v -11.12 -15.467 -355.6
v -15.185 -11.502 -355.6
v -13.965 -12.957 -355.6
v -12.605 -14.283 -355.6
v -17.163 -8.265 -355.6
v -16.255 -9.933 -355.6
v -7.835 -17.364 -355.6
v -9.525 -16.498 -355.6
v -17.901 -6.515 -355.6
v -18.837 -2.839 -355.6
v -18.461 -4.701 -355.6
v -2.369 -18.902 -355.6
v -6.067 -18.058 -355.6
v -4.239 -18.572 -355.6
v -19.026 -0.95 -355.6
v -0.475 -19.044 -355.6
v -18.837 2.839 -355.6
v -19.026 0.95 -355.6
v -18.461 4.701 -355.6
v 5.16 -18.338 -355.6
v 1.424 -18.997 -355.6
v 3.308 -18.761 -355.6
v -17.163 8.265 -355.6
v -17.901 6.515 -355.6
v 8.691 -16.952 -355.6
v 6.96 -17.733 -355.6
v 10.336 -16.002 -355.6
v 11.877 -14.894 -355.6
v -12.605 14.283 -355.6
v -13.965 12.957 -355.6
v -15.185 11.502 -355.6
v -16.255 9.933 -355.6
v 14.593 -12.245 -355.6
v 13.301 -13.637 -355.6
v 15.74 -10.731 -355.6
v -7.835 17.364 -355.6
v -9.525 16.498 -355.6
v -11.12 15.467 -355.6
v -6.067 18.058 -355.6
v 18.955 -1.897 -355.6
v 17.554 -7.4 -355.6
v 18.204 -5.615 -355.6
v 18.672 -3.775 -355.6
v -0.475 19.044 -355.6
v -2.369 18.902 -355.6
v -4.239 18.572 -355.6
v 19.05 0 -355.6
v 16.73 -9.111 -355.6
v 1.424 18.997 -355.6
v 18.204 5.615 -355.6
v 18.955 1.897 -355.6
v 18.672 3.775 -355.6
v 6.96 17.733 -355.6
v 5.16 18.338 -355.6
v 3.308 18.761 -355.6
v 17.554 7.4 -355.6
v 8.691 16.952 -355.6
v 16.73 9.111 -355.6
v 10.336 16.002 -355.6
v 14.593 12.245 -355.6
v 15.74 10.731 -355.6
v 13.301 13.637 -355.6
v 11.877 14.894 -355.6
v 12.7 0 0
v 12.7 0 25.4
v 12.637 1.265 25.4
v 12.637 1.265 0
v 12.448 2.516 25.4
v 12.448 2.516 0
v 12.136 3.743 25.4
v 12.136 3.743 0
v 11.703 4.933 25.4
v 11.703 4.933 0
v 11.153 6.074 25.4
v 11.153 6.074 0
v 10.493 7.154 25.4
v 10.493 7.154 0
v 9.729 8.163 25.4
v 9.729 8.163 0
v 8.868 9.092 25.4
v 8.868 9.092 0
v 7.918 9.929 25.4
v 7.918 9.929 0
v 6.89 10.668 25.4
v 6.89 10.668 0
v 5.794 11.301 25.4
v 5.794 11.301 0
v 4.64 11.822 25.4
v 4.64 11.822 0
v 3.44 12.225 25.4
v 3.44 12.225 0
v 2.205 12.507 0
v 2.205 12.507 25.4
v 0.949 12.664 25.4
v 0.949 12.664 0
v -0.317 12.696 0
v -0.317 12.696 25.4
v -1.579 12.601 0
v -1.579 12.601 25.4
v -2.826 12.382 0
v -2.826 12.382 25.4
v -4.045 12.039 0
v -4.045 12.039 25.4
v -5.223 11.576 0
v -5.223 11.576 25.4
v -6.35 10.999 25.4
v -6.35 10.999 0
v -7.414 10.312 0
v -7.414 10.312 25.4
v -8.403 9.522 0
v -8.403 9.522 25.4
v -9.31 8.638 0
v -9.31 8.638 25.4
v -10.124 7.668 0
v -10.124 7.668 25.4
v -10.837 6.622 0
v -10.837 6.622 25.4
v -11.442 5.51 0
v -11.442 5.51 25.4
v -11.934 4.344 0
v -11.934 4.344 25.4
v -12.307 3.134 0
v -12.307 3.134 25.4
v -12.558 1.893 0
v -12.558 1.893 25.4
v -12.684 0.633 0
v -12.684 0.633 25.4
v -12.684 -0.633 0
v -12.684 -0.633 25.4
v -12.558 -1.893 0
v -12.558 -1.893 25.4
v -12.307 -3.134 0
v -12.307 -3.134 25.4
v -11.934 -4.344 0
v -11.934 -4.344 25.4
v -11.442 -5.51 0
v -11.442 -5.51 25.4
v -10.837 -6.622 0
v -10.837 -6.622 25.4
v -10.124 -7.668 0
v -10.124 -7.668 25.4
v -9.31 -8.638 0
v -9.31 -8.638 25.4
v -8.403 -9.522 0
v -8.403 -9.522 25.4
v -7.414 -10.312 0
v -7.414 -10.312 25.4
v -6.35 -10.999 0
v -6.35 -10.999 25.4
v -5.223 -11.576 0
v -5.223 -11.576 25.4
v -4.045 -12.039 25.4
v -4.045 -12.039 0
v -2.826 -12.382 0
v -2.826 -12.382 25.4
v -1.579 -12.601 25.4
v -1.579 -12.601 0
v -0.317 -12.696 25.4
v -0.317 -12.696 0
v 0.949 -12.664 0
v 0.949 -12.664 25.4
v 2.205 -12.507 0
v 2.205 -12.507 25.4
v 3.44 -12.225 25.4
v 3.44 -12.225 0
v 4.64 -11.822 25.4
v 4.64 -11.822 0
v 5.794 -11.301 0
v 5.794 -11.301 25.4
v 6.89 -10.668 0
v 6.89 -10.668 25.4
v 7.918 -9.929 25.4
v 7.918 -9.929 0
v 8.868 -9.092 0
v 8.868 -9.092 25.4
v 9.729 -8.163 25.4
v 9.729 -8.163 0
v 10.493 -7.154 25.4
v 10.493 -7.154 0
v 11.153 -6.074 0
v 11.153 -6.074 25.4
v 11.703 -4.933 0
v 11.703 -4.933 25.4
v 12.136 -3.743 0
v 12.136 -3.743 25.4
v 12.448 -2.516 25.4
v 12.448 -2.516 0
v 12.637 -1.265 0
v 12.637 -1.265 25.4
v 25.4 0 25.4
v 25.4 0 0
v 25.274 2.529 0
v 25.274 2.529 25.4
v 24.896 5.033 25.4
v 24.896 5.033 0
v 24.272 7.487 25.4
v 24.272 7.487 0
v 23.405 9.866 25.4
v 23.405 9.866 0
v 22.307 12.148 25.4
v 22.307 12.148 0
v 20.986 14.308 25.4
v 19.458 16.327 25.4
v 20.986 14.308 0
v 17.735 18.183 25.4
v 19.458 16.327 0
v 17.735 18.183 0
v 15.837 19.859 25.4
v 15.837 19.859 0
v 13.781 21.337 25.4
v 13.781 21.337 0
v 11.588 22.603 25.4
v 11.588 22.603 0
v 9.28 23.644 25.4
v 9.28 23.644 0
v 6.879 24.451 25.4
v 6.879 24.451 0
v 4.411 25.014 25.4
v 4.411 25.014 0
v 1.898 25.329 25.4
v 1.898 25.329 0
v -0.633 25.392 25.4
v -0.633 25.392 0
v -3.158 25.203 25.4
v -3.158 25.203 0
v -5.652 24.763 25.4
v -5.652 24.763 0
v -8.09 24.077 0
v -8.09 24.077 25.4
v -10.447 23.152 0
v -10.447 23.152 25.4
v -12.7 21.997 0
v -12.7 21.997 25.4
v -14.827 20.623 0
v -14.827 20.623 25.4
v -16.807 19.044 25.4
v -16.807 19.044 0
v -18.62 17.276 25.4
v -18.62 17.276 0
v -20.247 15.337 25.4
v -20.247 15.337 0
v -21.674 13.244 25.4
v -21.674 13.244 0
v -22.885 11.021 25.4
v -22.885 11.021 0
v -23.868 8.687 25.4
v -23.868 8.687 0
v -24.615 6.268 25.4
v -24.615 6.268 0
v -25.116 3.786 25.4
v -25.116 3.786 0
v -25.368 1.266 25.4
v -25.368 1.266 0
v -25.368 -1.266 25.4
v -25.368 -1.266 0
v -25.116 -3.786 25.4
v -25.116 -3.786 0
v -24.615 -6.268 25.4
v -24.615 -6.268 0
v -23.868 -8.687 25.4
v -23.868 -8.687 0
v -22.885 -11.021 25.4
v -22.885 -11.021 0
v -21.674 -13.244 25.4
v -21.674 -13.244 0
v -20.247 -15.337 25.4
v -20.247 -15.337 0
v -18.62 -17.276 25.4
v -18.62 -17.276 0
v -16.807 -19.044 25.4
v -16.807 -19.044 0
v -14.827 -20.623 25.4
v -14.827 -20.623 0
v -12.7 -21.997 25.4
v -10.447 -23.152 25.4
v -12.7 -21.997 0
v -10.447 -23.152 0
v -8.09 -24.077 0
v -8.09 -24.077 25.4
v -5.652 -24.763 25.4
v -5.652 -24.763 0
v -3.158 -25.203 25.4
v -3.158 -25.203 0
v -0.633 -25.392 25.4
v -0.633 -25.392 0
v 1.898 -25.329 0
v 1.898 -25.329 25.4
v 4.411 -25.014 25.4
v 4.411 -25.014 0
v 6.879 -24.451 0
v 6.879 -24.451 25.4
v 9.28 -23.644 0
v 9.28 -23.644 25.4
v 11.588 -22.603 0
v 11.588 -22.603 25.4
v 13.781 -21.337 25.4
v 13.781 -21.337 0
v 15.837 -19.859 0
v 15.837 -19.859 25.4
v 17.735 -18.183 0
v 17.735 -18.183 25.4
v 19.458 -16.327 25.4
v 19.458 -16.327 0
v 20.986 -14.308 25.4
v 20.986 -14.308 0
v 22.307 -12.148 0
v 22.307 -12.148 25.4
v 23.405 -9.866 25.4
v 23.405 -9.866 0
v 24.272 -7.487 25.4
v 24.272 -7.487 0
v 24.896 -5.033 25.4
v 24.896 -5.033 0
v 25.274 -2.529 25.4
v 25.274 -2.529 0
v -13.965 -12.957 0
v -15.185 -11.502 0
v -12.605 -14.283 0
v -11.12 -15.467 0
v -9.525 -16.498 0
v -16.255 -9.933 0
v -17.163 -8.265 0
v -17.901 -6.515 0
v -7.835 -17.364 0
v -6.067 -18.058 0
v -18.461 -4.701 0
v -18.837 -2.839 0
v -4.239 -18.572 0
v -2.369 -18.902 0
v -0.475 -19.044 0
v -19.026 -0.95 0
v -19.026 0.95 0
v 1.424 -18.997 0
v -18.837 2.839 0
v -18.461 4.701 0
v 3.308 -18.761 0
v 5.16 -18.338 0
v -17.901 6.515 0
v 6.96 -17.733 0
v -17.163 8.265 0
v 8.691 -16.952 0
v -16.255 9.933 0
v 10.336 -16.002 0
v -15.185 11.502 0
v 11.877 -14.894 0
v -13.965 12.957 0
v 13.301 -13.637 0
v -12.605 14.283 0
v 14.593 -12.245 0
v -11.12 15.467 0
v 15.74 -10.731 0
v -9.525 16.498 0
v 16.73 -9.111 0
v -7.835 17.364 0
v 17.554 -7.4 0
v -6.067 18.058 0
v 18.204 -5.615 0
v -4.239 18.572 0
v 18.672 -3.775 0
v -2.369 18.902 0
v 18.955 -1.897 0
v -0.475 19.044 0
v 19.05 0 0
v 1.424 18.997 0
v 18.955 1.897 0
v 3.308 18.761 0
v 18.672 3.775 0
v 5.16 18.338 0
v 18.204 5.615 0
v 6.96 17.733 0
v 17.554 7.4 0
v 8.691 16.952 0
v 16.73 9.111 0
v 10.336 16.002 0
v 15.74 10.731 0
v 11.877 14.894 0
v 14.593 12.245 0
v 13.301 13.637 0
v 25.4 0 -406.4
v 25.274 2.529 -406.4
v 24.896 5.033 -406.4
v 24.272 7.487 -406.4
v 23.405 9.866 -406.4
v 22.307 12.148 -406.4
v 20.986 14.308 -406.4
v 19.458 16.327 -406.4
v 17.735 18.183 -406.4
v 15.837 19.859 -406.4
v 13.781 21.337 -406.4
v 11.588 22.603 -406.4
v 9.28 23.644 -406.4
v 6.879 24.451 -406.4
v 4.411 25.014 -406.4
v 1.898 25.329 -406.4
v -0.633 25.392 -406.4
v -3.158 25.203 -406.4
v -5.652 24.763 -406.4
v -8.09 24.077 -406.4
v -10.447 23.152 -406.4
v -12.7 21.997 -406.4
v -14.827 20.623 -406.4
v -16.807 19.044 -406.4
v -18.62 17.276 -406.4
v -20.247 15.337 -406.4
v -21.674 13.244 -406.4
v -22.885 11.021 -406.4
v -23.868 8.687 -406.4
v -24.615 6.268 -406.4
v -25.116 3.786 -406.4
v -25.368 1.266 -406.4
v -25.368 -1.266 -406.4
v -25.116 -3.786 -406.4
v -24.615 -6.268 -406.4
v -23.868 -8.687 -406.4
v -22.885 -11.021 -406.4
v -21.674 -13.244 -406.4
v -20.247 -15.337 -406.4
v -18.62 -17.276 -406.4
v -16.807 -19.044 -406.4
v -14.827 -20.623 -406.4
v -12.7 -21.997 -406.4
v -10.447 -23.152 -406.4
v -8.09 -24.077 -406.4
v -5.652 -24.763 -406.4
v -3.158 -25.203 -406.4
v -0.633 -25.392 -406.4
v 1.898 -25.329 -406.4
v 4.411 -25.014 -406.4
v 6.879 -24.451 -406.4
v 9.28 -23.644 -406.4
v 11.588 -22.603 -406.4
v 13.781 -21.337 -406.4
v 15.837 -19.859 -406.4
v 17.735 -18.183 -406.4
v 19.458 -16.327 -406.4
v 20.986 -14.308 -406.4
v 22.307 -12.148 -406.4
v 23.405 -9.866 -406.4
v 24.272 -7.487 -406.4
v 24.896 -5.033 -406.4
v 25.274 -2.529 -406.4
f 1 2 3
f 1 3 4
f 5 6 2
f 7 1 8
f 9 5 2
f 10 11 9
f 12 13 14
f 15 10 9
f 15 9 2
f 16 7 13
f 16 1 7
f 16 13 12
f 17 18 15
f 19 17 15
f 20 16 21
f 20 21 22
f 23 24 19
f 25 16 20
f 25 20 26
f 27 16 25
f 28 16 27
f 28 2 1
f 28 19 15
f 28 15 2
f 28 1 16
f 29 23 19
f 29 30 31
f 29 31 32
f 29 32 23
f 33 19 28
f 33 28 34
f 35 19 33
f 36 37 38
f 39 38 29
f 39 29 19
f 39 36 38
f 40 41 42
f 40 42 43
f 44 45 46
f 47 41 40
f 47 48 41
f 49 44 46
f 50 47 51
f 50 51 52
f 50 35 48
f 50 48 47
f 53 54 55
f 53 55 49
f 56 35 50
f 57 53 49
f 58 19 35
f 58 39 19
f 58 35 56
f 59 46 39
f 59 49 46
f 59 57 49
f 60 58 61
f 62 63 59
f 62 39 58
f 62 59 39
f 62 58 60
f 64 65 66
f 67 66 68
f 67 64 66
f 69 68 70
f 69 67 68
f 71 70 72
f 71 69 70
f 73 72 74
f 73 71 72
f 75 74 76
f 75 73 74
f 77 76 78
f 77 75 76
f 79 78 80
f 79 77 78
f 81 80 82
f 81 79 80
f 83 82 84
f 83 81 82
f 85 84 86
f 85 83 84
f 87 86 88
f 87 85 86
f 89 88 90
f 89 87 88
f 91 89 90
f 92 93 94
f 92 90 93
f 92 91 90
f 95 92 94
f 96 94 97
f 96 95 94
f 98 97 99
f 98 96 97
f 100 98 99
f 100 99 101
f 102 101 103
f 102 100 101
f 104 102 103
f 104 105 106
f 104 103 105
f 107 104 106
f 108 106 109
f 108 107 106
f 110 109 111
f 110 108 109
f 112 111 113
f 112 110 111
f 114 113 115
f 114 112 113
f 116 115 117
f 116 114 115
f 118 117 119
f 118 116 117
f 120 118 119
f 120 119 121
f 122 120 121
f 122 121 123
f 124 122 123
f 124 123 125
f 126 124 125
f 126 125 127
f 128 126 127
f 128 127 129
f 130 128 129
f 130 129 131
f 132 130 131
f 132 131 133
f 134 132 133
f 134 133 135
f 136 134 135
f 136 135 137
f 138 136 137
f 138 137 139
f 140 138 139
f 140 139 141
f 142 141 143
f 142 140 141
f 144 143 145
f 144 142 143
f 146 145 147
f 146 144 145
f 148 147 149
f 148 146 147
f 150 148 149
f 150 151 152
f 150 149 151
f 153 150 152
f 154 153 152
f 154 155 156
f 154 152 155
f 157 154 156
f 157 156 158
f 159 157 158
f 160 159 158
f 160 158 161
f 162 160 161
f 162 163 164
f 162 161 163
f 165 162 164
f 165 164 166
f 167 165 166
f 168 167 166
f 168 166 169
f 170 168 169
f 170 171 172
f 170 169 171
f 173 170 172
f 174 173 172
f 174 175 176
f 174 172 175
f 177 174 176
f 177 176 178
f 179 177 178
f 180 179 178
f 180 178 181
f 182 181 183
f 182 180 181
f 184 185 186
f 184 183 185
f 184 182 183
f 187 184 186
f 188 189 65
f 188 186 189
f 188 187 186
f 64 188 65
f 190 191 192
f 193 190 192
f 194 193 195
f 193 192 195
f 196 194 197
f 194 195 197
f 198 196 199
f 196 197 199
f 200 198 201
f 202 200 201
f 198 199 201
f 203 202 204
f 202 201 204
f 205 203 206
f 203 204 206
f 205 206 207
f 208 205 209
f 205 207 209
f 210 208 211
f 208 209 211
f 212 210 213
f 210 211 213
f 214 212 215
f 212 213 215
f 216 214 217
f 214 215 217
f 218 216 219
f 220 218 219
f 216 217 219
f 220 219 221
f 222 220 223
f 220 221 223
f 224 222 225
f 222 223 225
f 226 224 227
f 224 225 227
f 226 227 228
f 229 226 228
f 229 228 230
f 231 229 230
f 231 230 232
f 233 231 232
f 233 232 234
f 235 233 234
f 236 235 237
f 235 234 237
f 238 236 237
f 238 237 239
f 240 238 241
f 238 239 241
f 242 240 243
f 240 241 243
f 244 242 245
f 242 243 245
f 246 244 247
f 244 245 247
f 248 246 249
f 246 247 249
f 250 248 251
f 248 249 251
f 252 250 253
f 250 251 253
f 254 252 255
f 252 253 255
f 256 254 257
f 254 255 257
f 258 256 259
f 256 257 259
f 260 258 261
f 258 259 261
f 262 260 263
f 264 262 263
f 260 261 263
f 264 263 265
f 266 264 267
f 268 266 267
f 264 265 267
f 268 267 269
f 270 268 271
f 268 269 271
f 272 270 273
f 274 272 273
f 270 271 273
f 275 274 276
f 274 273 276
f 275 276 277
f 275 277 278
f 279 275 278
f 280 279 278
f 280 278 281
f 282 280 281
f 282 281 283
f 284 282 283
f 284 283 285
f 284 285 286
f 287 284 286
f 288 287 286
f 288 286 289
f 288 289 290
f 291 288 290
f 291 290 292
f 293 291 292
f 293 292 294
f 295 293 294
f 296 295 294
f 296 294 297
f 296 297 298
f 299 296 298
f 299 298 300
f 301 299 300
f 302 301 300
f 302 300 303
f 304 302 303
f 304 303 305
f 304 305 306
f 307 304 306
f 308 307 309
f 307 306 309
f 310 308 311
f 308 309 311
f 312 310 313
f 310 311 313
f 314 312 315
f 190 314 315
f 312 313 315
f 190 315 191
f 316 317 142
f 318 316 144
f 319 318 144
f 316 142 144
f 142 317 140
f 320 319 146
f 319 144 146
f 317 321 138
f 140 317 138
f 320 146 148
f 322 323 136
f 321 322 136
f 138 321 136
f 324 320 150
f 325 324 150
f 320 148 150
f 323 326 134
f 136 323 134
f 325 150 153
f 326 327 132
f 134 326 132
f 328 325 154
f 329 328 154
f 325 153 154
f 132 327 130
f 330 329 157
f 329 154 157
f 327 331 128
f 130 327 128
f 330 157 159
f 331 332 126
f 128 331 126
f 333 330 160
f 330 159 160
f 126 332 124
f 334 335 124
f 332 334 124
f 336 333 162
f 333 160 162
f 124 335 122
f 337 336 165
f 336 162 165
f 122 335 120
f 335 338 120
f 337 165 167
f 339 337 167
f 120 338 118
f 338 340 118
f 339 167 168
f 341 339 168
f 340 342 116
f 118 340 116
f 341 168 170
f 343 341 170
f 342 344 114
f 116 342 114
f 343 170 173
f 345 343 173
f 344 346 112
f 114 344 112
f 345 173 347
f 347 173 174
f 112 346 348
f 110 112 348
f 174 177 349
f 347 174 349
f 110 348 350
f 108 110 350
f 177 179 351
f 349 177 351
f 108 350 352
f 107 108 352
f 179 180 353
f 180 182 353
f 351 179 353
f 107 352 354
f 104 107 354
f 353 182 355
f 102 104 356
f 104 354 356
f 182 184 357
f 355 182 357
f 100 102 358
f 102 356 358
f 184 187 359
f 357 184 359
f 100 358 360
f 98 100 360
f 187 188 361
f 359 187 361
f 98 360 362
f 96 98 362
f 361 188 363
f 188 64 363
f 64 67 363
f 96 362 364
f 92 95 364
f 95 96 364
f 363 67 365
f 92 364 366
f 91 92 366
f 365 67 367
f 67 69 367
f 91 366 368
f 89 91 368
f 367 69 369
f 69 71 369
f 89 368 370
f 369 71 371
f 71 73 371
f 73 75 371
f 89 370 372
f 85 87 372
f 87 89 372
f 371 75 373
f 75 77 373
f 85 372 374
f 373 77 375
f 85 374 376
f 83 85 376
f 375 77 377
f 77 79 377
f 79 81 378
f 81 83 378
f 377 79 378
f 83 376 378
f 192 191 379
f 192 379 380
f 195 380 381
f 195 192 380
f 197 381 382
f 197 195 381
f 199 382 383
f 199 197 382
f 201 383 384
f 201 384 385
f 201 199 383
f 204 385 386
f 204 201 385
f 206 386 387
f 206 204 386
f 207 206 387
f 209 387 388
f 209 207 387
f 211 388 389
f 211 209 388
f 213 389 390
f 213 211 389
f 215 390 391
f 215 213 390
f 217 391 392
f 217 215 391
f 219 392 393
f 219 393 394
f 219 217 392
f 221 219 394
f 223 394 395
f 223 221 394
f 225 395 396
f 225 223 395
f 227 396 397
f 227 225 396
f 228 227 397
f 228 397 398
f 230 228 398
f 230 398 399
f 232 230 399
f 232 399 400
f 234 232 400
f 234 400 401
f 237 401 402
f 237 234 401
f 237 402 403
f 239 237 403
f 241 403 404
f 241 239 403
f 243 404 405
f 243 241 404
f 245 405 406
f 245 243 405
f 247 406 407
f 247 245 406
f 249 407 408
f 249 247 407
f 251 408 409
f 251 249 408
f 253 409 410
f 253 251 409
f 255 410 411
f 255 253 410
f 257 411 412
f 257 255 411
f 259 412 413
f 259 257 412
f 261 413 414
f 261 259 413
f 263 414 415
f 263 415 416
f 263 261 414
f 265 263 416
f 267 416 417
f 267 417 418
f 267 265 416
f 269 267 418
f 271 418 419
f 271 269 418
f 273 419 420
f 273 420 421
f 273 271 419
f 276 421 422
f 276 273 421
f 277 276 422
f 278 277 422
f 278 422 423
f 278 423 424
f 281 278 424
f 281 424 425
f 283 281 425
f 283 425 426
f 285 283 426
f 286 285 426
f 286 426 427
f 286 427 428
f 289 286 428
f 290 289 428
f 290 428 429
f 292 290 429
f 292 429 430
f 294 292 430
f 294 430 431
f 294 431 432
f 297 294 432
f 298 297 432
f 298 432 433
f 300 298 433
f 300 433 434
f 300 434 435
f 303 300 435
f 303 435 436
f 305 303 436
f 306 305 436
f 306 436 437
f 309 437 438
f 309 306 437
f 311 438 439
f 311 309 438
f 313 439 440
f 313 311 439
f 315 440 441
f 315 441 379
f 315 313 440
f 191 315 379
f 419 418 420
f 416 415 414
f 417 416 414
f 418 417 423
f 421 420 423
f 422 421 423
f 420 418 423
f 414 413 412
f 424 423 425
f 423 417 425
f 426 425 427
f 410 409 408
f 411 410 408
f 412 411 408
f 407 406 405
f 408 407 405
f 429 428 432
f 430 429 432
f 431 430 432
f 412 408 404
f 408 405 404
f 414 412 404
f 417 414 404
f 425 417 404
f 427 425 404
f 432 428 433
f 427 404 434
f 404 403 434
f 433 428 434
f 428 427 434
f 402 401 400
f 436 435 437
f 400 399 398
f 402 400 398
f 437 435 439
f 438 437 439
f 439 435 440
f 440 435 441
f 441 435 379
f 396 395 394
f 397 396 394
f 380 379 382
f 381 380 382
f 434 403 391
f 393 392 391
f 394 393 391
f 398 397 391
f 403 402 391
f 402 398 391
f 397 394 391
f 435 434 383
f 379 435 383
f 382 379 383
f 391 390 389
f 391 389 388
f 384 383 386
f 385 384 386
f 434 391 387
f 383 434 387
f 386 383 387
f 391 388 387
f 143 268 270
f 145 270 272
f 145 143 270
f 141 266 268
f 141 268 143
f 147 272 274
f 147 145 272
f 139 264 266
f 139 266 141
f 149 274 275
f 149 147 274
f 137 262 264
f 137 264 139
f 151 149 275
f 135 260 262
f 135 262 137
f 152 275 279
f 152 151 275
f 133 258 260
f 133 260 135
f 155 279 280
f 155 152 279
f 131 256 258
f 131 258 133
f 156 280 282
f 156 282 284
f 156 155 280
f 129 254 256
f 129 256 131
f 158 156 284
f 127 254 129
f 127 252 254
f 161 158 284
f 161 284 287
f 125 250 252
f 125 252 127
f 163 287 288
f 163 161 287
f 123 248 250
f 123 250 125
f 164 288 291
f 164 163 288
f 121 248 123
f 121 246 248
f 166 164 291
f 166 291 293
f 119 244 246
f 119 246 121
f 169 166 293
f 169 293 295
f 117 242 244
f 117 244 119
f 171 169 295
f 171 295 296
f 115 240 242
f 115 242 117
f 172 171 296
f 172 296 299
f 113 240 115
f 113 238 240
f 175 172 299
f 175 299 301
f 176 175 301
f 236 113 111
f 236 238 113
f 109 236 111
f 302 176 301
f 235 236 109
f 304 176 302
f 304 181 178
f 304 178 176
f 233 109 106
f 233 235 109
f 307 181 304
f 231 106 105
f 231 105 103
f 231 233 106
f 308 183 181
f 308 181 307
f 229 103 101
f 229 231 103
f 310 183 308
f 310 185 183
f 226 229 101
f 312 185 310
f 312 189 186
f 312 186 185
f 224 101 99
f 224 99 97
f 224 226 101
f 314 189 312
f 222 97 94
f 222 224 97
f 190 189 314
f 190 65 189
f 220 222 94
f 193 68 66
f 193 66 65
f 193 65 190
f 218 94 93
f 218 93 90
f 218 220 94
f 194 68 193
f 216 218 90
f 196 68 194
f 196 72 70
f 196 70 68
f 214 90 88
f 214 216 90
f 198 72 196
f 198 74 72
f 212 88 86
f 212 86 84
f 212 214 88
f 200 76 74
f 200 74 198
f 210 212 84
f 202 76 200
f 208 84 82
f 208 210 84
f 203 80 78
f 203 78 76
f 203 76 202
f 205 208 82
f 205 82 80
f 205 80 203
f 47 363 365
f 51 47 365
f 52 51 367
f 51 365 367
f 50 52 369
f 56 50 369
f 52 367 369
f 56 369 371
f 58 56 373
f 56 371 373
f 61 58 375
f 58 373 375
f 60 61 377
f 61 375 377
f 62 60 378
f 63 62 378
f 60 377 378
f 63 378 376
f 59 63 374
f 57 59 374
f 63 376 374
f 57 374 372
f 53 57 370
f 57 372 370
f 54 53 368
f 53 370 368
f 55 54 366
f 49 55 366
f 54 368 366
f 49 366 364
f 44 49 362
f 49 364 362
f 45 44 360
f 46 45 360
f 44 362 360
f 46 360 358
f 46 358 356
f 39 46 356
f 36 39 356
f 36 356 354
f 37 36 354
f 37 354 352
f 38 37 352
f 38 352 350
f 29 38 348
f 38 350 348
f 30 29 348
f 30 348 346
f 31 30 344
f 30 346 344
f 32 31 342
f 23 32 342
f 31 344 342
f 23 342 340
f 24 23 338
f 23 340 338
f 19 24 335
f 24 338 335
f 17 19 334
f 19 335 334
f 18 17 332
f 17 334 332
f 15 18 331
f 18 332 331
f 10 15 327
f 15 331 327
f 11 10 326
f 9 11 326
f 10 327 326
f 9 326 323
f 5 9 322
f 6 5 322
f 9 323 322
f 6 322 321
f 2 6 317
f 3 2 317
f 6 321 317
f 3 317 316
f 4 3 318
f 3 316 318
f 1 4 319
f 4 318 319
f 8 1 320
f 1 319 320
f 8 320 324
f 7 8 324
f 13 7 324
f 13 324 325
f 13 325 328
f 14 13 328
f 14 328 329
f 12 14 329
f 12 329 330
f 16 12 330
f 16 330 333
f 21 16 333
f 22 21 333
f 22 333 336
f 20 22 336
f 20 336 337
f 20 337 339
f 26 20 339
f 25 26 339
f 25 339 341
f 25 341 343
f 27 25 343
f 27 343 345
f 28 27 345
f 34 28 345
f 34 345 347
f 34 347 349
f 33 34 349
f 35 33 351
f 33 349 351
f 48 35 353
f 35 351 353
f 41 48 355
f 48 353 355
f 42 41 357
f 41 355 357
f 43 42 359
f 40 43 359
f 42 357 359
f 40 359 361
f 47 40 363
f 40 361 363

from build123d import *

# Parameters (mm, degrees)
F0_R          = 25.4
F1_DEPTH      = 406.4
F1_DEPTH_BACK = 25.4
F2_R          = 19.05
F3_DEPTH      = 355.6
F4_R          = 12.7
F5_DEPTH      = 25.401


with BuildPart() as f1:
    # F0 (on Top) → F1 (new body, two sides)
    with BuildSketch(Plane.XY) as f1_sk:
        Circle(F0_R)
    extrude(amount=-F1_DEPTH)
    extrude(f1_sk.sketch, amount=F1_DEPTH_BACK)

    # F2 (on Top) → F3 (cut)
    with BuildSketch(Plane.XY):
        Circle(F2_R)
    extrude(amount=-F3_DEPTH, mode=Mode.SUBTRACT)

    # F4 (on Top) → F5 (cut, through all)
    with BuildSketch(Plane.XY):
        Circle(F4_R)
    extrude(amount=F5_DEPTH, mode=Mode.SUBTRACT)


solid = f1.part
